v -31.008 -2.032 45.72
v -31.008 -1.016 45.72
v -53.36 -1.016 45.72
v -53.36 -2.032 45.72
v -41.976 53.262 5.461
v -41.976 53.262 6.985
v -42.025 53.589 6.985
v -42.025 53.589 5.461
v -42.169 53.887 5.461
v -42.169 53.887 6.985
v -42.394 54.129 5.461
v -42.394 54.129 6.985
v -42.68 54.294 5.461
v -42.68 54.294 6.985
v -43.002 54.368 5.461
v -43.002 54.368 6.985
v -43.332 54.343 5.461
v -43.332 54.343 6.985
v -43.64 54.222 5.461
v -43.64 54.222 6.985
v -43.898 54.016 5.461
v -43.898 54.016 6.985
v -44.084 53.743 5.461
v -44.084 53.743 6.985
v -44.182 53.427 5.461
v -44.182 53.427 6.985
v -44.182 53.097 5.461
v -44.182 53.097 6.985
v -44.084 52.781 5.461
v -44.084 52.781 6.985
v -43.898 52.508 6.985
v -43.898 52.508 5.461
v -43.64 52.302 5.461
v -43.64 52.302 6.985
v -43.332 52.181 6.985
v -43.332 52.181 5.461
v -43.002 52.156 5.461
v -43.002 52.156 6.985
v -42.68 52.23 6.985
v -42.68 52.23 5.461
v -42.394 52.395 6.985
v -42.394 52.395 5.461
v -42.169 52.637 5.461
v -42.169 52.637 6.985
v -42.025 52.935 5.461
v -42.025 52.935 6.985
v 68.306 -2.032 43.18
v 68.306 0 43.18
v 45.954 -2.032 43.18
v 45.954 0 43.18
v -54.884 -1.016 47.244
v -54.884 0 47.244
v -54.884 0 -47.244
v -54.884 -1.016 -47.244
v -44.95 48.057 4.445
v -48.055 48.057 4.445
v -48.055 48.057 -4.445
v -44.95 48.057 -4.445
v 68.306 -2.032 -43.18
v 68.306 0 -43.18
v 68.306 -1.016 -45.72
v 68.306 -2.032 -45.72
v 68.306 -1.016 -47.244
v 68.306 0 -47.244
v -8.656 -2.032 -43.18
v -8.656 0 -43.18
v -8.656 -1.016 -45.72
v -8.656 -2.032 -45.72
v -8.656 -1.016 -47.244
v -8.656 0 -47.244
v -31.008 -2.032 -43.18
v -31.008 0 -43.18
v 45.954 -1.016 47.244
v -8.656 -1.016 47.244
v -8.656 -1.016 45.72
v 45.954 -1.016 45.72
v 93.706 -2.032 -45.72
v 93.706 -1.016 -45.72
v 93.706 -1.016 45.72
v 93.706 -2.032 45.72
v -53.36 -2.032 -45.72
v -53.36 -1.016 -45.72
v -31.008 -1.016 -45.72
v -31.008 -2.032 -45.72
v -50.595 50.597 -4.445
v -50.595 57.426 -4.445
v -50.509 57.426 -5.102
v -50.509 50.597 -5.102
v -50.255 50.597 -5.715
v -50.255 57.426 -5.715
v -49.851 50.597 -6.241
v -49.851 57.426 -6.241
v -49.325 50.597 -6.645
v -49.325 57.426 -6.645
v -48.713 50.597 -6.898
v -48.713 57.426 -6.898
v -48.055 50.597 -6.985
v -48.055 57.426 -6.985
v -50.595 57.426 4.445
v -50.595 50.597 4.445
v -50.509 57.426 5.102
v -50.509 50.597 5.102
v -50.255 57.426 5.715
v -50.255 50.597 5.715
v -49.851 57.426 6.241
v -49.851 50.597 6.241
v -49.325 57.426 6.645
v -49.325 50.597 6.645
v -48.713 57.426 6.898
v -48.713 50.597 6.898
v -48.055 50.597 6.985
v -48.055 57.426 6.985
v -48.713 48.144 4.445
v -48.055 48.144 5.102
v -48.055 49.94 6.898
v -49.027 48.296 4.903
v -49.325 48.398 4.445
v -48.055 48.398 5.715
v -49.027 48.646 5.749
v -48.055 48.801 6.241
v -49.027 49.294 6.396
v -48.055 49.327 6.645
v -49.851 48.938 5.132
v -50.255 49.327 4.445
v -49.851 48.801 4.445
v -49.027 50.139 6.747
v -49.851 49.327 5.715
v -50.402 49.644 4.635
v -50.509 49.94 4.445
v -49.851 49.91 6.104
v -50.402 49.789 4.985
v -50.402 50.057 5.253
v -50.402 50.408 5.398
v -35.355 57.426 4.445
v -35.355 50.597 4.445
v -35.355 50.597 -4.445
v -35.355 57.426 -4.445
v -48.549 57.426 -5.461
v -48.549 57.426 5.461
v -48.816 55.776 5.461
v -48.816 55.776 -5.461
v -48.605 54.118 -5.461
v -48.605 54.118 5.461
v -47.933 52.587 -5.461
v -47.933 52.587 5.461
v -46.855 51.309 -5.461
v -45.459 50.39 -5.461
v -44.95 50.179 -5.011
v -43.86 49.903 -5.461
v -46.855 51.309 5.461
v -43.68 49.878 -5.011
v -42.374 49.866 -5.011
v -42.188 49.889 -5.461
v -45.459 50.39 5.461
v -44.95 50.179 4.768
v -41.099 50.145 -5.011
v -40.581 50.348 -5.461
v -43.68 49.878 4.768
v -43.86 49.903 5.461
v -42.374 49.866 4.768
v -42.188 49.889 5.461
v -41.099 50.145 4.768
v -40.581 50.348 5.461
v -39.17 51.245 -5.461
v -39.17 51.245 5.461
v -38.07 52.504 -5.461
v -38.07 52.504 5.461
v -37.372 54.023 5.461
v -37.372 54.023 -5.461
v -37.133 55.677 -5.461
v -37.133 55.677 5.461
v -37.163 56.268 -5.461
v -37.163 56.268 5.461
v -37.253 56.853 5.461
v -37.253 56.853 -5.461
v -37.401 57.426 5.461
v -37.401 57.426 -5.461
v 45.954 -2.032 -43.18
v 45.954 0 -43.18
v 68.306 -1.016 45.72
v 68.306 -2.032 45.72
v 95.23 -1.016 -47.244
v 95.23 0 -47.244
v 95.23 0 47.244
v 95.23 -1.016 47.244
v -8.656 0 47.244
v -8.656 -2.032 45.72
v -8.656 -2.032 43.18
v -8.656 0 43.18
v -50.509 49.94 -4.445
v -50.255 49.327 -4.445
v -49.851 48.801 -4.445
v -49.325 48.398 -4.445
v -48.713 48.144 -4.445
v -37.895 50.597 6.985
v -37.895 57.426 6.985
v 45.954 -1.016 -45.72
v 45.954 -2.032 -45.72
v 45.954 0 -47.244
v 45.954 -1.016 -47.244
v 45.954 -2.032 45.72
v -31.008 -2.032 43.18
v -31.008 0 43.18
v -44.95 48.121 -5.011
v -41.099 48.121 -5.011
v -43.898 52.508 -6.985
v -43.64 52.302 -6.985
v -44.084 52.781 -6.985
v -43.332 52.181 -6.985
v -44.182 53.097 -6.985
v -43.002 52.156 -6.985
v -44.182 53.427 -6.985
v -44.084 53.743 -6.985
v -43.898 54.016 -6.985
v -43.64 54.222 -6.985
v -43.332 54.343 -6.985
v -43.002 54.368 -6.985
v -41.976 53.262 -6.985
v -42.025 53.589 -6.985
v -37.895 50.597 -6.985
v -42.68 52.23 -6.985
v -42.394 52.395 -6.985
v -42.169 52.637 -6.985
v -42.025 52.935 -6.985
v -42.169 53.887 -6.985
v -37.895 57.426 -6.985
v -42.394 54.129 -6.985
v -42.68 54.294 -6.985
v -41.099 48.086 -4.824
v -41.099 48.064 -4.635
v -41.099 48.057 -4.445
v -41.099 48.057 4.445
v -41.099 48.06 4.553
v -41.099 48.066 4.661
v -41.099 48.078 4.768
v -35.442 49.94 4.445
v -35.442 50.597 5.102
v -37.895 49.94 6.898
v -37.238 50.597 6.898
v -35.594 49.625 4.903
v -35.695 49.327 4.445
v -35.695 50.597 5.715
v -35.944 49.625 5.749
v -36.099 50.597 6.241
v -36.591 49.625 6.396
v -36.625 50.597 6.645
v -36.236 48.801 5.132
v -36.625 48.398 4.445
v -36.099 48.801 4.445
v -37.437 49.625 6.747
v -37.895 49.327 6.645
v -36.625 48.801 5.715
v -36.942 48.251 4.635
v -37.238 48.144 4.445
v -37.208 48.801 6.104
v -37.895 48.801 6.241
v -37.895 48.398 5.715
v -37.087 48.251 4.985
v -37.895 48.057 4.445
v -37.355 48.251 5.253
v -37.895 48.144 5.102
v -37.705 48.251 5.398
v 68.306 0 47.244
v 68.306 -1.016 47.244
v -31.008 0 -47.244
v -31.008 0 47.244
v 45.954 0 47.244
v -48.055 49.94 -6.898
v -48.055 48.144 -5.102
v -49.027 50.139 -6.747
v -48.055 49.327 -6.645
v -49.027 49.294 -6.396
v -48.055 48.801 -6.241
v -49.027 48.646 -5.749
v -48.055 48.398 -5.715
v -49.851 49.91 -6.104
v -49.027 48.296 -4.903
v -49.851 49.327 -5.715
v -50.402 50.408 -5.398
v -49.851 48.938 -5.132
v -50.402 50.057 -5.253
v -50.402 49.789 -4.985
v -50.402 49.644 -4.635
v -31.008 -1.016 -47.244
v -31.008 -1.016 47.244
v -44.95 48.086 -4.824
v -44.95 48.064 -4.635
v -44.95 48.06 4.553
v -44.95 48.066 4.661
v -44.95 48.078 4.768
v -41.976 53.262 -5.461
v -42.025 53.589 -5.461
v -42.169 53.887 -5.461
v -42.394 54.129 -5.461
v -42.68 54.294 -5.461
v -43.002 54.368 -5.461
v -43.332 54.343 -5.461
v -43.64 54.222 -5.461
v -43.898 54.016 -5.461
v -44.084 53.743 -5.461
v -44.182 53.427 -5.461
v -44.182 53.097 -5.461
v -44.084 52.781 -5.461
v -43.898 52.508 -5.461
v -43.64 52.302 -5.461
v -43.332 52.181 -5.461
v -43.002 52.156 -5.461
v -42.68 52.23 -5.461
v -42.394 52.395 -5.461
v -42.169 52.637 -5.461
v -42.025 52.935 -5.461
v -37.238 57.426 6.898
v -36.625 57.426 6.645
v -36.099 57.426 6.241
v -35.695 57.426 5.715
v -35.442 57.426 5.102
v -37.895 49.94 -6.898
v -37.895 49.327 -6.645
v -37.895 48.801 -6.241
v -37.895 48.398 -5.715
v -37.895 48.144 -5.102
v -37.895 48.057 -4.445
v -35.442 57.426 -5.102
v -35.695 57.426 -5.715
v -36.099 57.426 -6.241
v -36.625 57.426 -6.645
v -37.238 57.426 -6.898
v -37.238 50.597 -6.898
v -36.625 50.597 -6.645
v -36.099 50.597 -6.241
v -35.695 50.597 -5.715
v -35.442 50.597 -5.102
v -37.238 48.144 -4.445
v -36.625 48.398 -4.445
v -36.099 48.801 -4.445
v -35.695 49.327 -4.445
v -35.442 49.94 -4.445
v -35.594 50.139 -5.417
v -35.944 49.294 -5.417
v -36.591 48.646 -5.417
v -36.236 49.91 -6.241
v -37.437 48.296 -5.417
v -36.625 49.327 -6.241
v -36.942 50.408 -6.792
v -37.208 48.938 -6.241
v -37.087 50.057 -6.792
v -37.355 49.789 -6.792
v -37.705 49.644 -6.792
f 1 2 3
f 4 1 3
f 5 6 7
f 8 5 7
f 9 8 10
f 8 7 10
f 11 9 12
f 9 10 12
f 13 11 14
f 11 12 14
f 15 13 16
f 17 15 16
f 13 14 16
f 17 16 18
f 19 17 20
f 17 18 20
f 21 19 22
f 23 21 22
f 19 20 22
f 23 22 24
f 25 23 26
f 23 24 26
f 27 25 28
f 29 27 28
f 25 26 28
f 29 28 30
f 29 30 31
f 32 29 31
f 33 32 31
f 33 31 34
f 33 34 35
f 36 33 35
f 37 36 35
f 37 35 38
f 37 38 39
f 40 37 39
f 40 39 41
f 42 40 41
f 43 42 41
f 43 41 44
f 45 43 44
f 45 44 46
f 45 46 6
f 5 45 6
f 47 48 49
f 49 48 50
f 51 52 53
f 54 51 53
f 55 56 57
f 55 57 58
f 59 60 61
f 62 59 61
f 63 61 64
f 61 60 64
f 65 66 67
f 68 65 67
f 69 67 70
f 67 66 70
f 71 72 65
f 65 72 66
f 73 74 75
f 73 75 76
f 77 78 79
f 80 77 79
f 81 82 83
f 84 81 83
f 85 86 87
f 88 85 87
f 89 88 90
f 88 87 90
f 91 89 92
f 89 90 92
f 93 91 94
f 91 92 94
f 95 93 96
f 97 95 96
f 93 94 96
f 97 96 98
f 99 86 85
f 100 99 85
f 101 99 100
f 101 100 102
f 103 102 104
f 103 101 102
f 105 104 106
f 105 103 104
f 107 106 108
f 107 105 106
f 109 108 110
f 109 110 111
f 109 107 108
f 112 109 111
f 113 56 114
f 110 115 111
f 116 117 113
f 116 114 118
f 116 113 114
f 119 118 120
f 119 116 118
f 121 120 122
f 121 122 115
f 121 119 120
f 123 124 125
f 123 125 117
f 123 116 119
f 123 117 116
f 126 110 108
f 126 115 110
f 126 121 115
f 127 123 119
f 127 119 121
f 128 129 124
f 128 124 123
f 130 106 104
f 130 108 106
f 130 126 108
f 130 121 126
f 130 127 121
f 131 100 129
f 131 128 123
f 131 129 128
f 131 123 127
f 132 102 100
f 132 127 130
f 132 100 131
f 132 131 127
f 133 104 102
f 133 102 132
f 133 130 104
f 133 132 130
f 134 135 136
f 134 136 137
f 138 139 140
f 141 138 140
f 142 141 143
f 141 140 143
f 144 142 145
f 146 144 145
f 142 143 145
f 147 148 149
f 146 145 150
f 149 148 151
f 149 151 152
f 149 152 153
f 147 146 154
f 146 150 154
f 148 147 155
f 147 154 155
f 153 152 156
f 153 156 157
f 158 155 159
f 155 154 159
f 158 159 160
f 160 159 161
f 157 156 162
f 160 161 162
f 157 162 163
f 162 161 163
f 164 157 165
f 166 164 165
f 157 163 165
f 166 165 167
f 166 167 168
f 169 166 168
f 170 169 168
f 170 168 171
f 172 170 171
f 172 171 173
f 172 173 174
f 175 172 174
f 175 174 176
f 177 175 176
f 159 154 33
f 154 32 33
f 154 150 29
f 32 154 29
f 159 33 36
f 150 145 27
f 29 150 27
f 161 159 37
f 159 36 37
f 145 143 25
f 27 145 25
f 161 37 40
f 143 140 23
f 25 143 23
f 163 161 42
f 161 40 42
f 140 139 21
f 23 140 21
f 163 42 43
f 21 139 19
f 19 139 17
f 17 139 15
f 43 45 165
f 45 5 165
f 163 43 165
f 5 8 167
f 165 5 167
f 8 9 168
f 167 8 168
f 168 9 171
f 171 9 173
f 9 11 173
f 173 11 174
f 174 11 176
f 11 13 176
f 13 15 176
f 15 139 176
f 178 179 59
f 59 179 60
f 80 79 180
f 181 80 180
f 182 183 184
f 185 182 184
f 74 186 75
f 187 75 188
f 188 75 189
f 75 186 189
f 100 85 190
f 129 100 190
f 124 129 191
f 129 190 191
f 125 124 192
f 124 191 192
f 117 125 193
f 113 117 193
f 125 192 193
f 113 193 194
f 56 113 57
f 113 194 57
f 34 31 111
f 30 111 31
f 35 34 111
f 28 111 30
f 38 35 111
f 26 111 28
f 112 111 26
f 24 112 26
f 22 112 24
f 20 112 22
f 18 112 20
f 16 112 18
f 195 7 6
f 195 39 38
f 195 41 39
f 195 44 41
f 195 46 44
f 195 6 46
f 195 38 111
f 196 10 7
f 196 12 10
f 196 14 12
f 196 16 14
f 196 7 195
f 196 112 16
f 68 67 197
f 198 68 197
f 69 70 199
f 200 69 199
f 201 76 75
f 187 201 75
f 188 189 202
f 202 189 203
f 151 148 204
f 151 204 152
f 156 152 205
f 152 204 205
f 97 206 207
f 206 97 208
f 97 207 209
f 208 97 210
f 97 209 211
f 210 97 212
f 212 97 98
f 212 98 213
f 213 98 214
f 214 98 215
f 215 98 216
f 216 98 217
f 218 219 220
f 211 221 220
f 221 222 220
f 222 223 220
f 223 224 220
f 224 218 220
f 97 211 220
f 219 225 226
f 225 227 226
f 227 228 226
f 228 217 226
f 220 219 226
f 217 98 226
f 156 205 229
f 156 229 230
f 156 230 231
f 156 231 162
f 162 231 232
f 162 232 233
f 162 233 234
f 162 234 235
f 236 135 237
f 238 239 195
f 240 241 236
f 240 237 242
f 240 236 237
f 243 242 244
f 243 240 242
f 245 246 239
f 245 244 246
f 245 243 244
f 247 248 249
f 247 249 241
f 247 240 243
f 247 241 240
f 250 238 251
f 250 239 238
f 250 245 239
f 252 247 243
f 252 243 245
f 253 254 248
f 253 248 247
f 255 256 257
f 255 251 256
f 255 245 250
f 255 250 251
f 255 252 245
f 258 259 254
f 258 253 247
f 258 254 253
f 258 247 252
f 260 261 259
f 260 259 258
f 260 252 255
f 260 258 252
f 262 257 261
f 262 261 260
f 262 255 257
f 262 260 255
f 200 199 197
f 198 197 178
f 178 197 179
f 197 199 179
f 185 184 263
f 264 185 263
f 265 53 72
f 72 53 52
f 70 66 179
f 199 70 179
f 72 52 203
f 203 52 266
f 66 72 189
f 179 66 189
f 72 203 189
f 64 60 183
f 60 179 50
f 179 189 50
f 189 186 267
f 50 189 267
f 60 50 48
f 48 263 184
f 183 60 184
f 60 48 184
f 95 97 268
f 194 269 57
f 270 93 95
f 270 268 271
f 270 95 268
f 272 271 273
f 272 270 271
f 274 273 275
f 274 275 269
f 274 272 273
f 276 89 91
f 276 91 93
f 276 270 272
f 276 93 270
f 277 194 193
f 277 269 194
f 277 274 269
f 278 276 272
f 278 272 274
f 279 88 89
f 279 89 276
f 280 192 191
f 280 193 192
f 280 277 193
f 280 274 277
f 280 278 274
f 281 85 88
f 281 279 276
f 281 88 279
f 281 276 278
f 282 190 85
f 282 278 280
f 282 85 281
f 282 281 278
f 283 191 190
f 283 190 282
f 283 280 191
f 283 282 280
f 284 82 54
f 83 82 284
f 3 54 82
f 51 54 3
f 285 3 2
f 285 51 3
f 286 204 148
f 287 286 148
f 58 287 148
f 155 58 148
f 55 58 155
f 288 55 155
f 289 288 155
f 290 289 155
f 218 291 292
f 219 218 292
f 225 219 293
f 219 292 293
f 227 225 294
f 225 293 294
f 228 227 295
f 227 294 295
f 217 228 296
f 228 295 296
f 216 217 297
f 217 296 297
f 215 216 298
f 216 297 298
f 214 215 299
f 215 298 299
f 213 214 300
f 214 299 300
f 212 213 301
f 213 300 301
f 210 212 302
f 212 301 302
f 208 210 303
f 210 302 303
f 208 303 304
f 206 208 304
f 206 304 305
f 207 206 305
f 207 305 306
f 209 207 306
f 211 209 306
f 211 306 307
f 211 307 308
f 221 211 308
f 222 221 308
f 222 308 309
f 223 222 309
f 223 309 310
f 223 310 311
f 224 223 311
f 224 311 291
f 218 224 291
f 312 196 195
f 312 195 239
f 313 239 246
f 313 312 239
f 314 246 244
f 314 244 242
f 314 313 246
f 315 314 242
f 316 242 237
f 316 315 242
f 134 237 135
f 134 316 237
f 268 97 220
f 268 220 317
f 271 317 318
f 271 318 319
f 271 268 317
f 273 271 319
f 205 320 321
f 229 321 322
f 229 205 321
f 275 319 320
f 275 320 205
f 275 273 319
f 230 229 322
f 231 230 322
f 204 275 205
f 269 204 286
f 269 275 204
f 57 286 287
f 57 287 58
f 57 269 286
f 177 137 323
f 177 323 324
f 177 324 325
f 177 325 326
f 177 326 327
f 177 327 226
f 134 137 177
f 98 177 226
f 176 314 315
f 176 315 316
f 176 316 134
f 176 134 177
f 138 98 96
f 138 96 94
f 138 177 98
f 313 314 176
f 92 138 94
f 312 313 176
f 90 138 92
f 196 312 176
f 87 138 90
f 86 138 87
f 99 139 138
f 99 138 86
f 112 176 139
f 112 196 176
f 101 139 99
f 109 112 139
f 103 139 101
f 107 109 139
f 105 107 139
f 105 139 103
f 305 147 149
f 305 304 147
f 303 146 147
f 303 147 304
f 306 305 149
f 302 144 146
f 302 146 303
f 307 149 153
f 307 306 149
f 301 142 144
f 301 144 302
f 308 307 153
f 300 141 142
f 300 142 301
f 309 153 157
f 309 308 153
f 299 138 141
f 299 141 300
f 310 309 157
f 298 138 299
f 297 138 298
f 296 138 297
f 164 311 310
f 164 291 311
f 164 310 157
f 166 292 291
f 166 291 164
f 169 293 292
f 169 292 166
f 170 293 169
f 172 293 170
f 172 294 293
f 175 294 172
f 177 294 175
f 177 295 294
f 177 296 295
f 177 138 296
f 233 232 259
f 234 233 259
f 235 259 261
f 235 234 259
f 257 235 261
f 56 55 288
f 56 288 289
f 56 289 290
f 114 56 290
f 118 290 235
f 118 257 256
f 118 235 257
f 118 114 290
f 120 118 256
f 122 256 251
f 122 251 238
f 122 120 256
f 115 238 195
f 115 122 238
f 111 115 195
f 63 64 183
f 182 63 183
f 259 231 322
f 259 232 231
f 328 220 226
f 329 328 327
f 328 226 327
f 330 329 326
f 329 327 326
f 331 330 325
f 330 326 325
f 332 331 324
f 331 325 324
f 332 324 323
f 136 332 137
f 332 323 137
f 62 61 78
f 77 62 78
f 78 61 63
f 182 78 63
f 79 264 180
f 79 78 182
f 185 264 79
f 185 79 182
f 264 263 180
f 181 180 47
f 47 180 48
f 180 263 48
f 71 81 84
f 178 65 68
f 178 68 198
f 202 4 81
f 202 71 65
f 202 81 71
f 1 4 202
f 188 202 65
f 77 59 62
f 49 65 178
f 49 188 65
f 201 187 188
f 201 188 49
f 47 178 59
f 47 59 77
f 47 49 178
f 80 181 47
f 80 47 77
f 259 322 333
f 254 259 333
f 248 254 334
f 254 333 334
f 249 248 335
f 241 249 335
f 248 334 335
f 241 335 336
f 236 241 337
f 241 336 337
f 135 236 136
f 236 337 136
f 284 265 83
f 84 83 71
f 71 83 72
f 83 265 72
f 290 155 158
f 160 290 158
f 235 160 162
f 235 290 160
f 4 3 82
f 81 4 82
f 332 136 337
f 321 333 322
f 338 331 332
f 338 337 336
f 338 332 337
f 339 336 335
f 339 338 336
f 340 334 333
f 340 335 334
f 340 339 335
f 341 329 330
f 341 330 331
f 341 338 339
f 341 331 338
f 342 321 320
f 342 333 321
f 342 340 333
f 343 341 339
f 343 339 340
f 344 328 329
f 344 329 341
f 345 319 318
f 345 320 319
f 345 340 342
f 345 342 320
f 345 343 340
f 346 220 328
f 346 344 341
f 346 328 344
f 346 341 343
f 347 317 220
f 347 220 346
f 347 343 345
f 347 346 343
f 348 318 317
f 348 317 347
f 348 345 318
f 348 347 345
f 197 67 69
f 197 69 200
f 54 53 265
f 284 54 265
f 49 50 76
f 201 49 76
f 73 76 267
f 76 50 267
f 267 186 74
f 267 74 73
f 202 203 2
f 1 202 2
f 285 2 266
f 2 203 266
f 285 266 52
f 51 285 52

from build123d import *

# Parameters (mm, degrees)
F1_DEPTH      = 2.032
F0_W          = 54.61
F0_H          = 1.524
F2_DEPTH      = 1.016
F4_DEPTH      = 6.985
F5_DEPTH      = 5.461
F6_R          = 1.108982449
F7_DEPTH      = 25.4
F8_W          = 3.8512460887
F8_H          = 9.7791478038
F9_DEPTH      = 25.4
F10_T1_DEPTH  = 13.1787527424
F10_T3_DEPTH  = 8.89
F10_T5_DEPTH  = 10.16
F10_S9_W      = 2.54
F10_S9_H      = 2.54
F10_T10_DEPTH = 2.54
F10_S15_W     = 2.54
F10_S15_H     = 2.54
F10_T16_DEPTH = 2.54
F10_S21_W     = 2.54
F10_S21_H     = 2.54
F10_T22_DEPTH = 2.54
F10_S27_W     = 2.54
F10_S27_H     = 2.54
F10_T28_DEPTH = 2.54


# Not quite as in the source:
# - a fillet or chamfer that OpenCascade refuses, or shapes differently, is made with other operations: its cross-section is extruded or revolved along the edge and cut away or added


with BuildPart() as f1:
    # F0 (on Front) → F1 (new body)
    with BuildSketch(Plane.XZ):
        Polygon((-53.3597948303, 45.72), (-53.3597948303, 0), (93.7062051697, 0), (93.7062051697, 45.72), (68.3062051697, 45.72), (68.3062051697, 43.18), (45.9542051697, 43.18), (45.9542051697, 45.72), (-8.6557948303, 45.72), (-8.6557948303, 43.18), (-31.0077948303, 43.18), (-31.0077948303, 45.72), align=None)
        Polygon((93.7062051697, 0), (-53.3597948303, 0), (-53.3597948303, -45.72), (-31.0077948303, -45.72), (-31.0077948303, -43.18), (-8.6557948303, -43.18), (-8.6557948303, -45.72), (45.9542051697, -45.72), (45.9542051697, -43.18), (68.3062051697, -43.18), (68.3062051697, -45.72), (93.7062051697, -45.72), align=None)
    extrude(amount=F1_DEPTH)

    # F0 (on Front) → F2 (join)
    with BuildSketch(Plane.XZ):
        Polygon((-53.3597948303, -45.72), (-53.3597948303, 0), (-53.3597948303, 45.72), (-31.0077948303, 45.72), (-31.0077948303, 47.244), (-54.8837948303, 47.244), (-54.8837948303, 0), (-54.8837948303, -47.244), (-31.0077948303, -47.244), (-31.0077948303, -45.72), align=None)
        with Locations((18.6492051697, 46.482)):
            Rectangle(F0_W, F0_H)
        Polygon((93.7062051697, 45.72), (93.7062051697, 0), (93.7062051697, -45.72), (68.3062051697, -45.72), (68.3062051697, -47.244), (95.2302051697, -47.244), (95.2302051697, 12.7), (95.2302051697, 47.244), (68.3062051697, 47.244), (68.3062051697, 45.72), align=None)
        with Locations((18.6492051697, -46.482)):
            Rectangle(F0_W, F0_H)
    extrude(amount=F2_DEPTH)


with BuildPart() as f4:
    # F3 (on Top) → F4 (new body, symmetric)
    with BuildSketch(Plane.XY):
        with BuildLine():
            Line((-48.5492415086, 57.4260428548), (-50.5951202464, 57.4260428548))
            Line((-50.5951202464, 57.4260428548), (-50.5951202464, 48.0572901124))
            Line((-50.5951202464, 48.0572901124), (-35.3551202464, 48.0572901124))
            Line((-35.3551202464, 48.0572901124), (-35.3551202464, 57.4260428548))
            Line((-35.3551202464, 57.4260428548), (-37.4009989842, 57.4260428548))
            ThreePointArc((-37.4009989842, 57.4260428548), (-37.2004782482, 56.5618655999), (-37.1331202464, 55.6772901124))
            ThreePointArc((-37.1331202464, 55.6772901124), (-43.8596957339, 49.9026481143), (-48.5492415086, 57.4260428548))
        make_face()
        with BuildLine():
            Line((-37.4009989842, 57.4260428548), (-48.5492415086, 57.4260428548))
            ThreePointArc((-48.5492415086, 57.4260428548), (-43.8596957339, 49.9026481143), (-37.1331202464, 55.6772901124))
            ThreePointArc((-37.1331202464, 55.6772901124), (-37.2004782482, 56.5618655999), (-37.4009989842, 57.4260428548))
        make_face()
    extrude(amount=F4_DEPTH, both=True)

    # F3 (on Top) → F5 (cut, symmetric)
    with BuildSketch(Plane.XY):
        with BuildLine():
            Line((-37.4009989842, 57.4260428548), (-48.5492415086, 57.4260428548))
            ThreePointArc((-48.5492415086, 57.4260428548), (-43.8596957339, 49.9026481143), (-37.1331202464, 55.6772901124))
            ThreePointArc((-37.1331202464, 55.6772901124), (-37.2004782482, 56.5618655999), (-37.4009989842, 57.4260428548))
        make_face()
    extrude(amount=F5_DEPTH, both=True, mode=Mode.SUBTRACT)

    # F6 (on face) → F7 (cut)
    with BuildSketch(Plane.XY.offset(6.985)):
        with Locations((-43.0850237608, 53.2620474696)):
            Circle(F6_R)
    extrude(amount=-F7_DEPTH, mode=Mode.SUBTRACT)

    # F8 (on face) → F9 (cut)
    with BuildSketch(Plane.XZ.offset(-48.0572901124)):
        with Locations((-43.0246088654, -0.1216004603)):
            Rectangle(F8_W, F8_H)
    extrude(amount=-F9_DEPTH, mode=Mode.SUBTRACT)

    # F10: fillet of radius 2.54 on 8 edges, made by hand

    # F10_s2 → F10_t1 (cut)
    with BuildSketch(Plane.XZ.offset(-63.7760428548)):
        with BuildLine():
            ThreePointArc((-50.5951202464, 4.445), (-49.8511714706, 6.2410512242), (-48.0551202464, 6.985))
            Line((-48.0551202464, 6.985), (-50.5951202464, 6.985))
            Line((-50.5951202464, 6.985), (-50.5951202464, 4.445))
        make_face()
        with BuildLine():
            ThreePointArc((-50.5951202464, -4.445), (-49.8511714706, -6.2410512242), (-48.0551202464, -6.985))
            Line((-48.0551202464, -6.985), (-50.5951202464, -6.985))
            Line((-50.5951202464, -6.985), (-50.5951202464, -4.445))
        make_face()
        with BuildLine():
            ThreePointArc((-37.8951202464, 6.985), (-36.0990690222, 6.2410512242), (-35.3551202464, 4.445))
            Line((-35.3551202464, 4.445), (-35.3551202464, 6.985))
            Line((-35.3551202464, 6.985), (-37.8951202464, 6.985))
        make_face()
        with BuildLine():
            ThreePointArc((-37.8951202464, -6.985), (-36.0990690222, -6.2410512242), (-35.3551202464, -4.445))
            Line((-35.3551202464, -4.445), (-35.3551202464, -6.985))
            Line((-35.3551202464, -6.985), (-37.8951202464, -6.985))
        make_face()
    extrude(amount=F10_T1_DEPTH, mode=Mode.SUBTRACT)

    # F10_s4 → F10_t3 (cut)
    with BuildSketch(Plane.XY.offset(-4.445)):
        with BuildLine():
            ThreePointArc((-50.5951202464, 50.5972901124), (-49.8511714706, 48.8012388882), (-48.0551202464, 48.0572901124))
            Line((-48.0551202464, 48.0572901124), (-50.5951202464, 48.0572901124))
            Line((-50.5951202464, 48.0572901124), (-50.5951202464, 50.5972901124))
        make_face()
        with BuildLine():
            ThreePointArc((-37.8951202464, 48.0572901124), (-36.0990690222, 48.8012388882), (-35.3551202464, 50.5972901124))
            Line((-35.3551202464, 50.5972901124), (-35.3551202464, 48.0572901124))
            Line((-35.3551202464, 48.0572901124), (-37.8951202464, 48.0572901124))
        make_face()
    extrude(amount=F10_T3_DEPTH, mode=Mode.SUBTRACT)

    # F10_s6 → F10_t5 (cut)
    with BuildSketch(Plane.YZ.offset(-48.0551202464)):
        with BuildLine():
            ThreePointArc((50.5972901124, -6.985), (48.8012388882, -6.2410512242), (48.0572901124, -4.445))
            Line((48.0572901124, -4.445), (48.0572901124, -6.985))
            Line((48.0572901124, -6.985), (50.5972901124, -6.985))
        make_face()
        with BuildLine():
            ThreePointArc((48.0572901124, 4.445), (48.8012388882, 6.2410512242), (50.5972901124, 6.985))
            Line((50.5972901124, 6.985), (48.0572901124, 6.985))
            Line((48.0572901124, 6.985), (48.0572901124, 4.445))
        make_face()
    extrude(amount=F10_T5_DEPTH, mode=Mode.SUBTRACT)


with BuildPart() as f10_tool8:
    # F10_s9 → F10_t10 (new body)
    with BuildSketch(Plane.YZ.offset(-48.0551202464)):
        with Locations((49.3272901124, 5.715)):
            Rectangle(F10_S9_W, F10_S9_H)
    extrude(amount=-F10_T10_DEPTH)

    # F10_s11 → F10_t12 (revolve, cut)
    with BuildSketch(Plane(origin=(-48.0551202464, 50.5972901124, 4.445), x_dir=(0, 0.7071067812, -0.7071067812), z_dir=(0, 0.7071067812, 0.7071067812))):
        with BuildLine():
            ThreePointArc((0, -2.54), (2.54, 0), (0, 2.54))
            Line((0, 2.54), (0, -2.54))
        make_face()
    revolve(axis=Axis((-48.0551202464, 50.5972901124, 4.445), (-1, 0, 0)), mode=Mode.SUBTRACT)


with BuildPart() as f4_1:
    add(f4.part)

    # F10_t7: cut F10_tool8
    add(f10_tool8.part, mode=Mode.SUBTRACT)


with BuildPart() as f10_tool14:
    # F10_s15 → F10_t16 (new body)
    with BuildSketch(Plane.YZ.offset(-48.0551202464)):
        with Locations((49.3272901124, -5.715)):
            Rectangle(F10_S15_W, F10_S15_H)
    extrude(amount=-F10_T16_DEPTH)

    # F10_s17 → F10_t18 (revolve, cut)
    with BuildSketch(Plane(origin=(-48.0551202464, 50.5972901124, -4.445), x_dir=(0, 0.7071067812, 0.7071067812), z_dir=(0, -0.7071067812, 0.7071067812))):
        with BuildLine():
            ThreePointArc((0, -2.54), (2.54, 0), (0, 2.54))
            Line((0, 2.54), (0, -2.54))
        make_face()
    revolve(axis=Axis((-48.0551202464, 50.5972901124, -4.445), (-1, 0, 0)), mode=Mode.SUBTRACT)


with BuildPart() as f4_2:
    add(f4_1.part)

    # F10_t13: cut F10_tool14
    add(f10_tool14.part, mode=Mode.SUBTRACT)


with BuildPart() as f10_tool20:
    # F10_s21 → F10_t22 (new body)
    with BuildSketch(Plane.XZ.offset(-50.5972901124)):
        with Locations((-36.6251202464, 5.715)):
            Rectangle(F10_S21_W, F10_S21_H)
    extrude(amount=F10_T22_DEPTH)

    # F10_s23 → F10_t24 (revolve, cut)
    with BuildSketch(Plane(origin=(-37.8951202464, 50.5972901124, 4.445), x_dir=(-0.7071067812, 0, -0.7071067812), z_dir=(-0.7071067812, 0, 0.7071067812))):
        with BuildLine():
            ThreePointArc((0, -2.54), (2.54, 0), (0, 2.54))
            Line((0, 2.54), (0, -2.54))
        make_face()
    revolve(axis=Axis((-37.8951202464, 50.5972901124, 4.445), (0, -1, 0)), mode=Mode.SUBTRACT)


with BuildPart() as f4_3:
    add(f4_2.part)

    # F10_t19: cut F10_tool20
    add(f10_tool20.part, mode=Mode.SUBTRACT)


with BuildPart() as f10_tool26:
    # F10_s27 → F10_t28 (new body)
    with BuildSketch(Plane.XY.offset(-4.445)):
        with Locations((-36.6251202464, 49.3272901124)):
            Rectangle(F10_S27_W, F10_S27_H)
    extrude(amount=-F10_T28_DEPTH)

    # F10_s29 → F10_t30 (revolve, cut)
    with BuildSketch(Plane(origin=(-37.8951202464, 50.5972901124, -4.445), x_dir=(-0.7071067812, 0.7071067812, 0), z_dir=(-0.7071067812, -0.7071067812, 0))):
        with BuildLine():
            ThreePointArc((0, -2.54), (2.54, 0), (0, 2.54))
            Line((0, 2.54), (0, -2.54))
        make_face()
    revolve(axis=Axis((-37.8951202464, 50.5972901124, -4.445), (0, 0, -1)), mode=Mode.SUBTRACT)


with BuildPart() as f4_4:
    add(f4_3.part)

    # F10_t25: cut F10_tool26
    add(f10_tool26.part, mode=Mode.SUBTRACT)


solid = Compound([f1.part, f4_4.part])
